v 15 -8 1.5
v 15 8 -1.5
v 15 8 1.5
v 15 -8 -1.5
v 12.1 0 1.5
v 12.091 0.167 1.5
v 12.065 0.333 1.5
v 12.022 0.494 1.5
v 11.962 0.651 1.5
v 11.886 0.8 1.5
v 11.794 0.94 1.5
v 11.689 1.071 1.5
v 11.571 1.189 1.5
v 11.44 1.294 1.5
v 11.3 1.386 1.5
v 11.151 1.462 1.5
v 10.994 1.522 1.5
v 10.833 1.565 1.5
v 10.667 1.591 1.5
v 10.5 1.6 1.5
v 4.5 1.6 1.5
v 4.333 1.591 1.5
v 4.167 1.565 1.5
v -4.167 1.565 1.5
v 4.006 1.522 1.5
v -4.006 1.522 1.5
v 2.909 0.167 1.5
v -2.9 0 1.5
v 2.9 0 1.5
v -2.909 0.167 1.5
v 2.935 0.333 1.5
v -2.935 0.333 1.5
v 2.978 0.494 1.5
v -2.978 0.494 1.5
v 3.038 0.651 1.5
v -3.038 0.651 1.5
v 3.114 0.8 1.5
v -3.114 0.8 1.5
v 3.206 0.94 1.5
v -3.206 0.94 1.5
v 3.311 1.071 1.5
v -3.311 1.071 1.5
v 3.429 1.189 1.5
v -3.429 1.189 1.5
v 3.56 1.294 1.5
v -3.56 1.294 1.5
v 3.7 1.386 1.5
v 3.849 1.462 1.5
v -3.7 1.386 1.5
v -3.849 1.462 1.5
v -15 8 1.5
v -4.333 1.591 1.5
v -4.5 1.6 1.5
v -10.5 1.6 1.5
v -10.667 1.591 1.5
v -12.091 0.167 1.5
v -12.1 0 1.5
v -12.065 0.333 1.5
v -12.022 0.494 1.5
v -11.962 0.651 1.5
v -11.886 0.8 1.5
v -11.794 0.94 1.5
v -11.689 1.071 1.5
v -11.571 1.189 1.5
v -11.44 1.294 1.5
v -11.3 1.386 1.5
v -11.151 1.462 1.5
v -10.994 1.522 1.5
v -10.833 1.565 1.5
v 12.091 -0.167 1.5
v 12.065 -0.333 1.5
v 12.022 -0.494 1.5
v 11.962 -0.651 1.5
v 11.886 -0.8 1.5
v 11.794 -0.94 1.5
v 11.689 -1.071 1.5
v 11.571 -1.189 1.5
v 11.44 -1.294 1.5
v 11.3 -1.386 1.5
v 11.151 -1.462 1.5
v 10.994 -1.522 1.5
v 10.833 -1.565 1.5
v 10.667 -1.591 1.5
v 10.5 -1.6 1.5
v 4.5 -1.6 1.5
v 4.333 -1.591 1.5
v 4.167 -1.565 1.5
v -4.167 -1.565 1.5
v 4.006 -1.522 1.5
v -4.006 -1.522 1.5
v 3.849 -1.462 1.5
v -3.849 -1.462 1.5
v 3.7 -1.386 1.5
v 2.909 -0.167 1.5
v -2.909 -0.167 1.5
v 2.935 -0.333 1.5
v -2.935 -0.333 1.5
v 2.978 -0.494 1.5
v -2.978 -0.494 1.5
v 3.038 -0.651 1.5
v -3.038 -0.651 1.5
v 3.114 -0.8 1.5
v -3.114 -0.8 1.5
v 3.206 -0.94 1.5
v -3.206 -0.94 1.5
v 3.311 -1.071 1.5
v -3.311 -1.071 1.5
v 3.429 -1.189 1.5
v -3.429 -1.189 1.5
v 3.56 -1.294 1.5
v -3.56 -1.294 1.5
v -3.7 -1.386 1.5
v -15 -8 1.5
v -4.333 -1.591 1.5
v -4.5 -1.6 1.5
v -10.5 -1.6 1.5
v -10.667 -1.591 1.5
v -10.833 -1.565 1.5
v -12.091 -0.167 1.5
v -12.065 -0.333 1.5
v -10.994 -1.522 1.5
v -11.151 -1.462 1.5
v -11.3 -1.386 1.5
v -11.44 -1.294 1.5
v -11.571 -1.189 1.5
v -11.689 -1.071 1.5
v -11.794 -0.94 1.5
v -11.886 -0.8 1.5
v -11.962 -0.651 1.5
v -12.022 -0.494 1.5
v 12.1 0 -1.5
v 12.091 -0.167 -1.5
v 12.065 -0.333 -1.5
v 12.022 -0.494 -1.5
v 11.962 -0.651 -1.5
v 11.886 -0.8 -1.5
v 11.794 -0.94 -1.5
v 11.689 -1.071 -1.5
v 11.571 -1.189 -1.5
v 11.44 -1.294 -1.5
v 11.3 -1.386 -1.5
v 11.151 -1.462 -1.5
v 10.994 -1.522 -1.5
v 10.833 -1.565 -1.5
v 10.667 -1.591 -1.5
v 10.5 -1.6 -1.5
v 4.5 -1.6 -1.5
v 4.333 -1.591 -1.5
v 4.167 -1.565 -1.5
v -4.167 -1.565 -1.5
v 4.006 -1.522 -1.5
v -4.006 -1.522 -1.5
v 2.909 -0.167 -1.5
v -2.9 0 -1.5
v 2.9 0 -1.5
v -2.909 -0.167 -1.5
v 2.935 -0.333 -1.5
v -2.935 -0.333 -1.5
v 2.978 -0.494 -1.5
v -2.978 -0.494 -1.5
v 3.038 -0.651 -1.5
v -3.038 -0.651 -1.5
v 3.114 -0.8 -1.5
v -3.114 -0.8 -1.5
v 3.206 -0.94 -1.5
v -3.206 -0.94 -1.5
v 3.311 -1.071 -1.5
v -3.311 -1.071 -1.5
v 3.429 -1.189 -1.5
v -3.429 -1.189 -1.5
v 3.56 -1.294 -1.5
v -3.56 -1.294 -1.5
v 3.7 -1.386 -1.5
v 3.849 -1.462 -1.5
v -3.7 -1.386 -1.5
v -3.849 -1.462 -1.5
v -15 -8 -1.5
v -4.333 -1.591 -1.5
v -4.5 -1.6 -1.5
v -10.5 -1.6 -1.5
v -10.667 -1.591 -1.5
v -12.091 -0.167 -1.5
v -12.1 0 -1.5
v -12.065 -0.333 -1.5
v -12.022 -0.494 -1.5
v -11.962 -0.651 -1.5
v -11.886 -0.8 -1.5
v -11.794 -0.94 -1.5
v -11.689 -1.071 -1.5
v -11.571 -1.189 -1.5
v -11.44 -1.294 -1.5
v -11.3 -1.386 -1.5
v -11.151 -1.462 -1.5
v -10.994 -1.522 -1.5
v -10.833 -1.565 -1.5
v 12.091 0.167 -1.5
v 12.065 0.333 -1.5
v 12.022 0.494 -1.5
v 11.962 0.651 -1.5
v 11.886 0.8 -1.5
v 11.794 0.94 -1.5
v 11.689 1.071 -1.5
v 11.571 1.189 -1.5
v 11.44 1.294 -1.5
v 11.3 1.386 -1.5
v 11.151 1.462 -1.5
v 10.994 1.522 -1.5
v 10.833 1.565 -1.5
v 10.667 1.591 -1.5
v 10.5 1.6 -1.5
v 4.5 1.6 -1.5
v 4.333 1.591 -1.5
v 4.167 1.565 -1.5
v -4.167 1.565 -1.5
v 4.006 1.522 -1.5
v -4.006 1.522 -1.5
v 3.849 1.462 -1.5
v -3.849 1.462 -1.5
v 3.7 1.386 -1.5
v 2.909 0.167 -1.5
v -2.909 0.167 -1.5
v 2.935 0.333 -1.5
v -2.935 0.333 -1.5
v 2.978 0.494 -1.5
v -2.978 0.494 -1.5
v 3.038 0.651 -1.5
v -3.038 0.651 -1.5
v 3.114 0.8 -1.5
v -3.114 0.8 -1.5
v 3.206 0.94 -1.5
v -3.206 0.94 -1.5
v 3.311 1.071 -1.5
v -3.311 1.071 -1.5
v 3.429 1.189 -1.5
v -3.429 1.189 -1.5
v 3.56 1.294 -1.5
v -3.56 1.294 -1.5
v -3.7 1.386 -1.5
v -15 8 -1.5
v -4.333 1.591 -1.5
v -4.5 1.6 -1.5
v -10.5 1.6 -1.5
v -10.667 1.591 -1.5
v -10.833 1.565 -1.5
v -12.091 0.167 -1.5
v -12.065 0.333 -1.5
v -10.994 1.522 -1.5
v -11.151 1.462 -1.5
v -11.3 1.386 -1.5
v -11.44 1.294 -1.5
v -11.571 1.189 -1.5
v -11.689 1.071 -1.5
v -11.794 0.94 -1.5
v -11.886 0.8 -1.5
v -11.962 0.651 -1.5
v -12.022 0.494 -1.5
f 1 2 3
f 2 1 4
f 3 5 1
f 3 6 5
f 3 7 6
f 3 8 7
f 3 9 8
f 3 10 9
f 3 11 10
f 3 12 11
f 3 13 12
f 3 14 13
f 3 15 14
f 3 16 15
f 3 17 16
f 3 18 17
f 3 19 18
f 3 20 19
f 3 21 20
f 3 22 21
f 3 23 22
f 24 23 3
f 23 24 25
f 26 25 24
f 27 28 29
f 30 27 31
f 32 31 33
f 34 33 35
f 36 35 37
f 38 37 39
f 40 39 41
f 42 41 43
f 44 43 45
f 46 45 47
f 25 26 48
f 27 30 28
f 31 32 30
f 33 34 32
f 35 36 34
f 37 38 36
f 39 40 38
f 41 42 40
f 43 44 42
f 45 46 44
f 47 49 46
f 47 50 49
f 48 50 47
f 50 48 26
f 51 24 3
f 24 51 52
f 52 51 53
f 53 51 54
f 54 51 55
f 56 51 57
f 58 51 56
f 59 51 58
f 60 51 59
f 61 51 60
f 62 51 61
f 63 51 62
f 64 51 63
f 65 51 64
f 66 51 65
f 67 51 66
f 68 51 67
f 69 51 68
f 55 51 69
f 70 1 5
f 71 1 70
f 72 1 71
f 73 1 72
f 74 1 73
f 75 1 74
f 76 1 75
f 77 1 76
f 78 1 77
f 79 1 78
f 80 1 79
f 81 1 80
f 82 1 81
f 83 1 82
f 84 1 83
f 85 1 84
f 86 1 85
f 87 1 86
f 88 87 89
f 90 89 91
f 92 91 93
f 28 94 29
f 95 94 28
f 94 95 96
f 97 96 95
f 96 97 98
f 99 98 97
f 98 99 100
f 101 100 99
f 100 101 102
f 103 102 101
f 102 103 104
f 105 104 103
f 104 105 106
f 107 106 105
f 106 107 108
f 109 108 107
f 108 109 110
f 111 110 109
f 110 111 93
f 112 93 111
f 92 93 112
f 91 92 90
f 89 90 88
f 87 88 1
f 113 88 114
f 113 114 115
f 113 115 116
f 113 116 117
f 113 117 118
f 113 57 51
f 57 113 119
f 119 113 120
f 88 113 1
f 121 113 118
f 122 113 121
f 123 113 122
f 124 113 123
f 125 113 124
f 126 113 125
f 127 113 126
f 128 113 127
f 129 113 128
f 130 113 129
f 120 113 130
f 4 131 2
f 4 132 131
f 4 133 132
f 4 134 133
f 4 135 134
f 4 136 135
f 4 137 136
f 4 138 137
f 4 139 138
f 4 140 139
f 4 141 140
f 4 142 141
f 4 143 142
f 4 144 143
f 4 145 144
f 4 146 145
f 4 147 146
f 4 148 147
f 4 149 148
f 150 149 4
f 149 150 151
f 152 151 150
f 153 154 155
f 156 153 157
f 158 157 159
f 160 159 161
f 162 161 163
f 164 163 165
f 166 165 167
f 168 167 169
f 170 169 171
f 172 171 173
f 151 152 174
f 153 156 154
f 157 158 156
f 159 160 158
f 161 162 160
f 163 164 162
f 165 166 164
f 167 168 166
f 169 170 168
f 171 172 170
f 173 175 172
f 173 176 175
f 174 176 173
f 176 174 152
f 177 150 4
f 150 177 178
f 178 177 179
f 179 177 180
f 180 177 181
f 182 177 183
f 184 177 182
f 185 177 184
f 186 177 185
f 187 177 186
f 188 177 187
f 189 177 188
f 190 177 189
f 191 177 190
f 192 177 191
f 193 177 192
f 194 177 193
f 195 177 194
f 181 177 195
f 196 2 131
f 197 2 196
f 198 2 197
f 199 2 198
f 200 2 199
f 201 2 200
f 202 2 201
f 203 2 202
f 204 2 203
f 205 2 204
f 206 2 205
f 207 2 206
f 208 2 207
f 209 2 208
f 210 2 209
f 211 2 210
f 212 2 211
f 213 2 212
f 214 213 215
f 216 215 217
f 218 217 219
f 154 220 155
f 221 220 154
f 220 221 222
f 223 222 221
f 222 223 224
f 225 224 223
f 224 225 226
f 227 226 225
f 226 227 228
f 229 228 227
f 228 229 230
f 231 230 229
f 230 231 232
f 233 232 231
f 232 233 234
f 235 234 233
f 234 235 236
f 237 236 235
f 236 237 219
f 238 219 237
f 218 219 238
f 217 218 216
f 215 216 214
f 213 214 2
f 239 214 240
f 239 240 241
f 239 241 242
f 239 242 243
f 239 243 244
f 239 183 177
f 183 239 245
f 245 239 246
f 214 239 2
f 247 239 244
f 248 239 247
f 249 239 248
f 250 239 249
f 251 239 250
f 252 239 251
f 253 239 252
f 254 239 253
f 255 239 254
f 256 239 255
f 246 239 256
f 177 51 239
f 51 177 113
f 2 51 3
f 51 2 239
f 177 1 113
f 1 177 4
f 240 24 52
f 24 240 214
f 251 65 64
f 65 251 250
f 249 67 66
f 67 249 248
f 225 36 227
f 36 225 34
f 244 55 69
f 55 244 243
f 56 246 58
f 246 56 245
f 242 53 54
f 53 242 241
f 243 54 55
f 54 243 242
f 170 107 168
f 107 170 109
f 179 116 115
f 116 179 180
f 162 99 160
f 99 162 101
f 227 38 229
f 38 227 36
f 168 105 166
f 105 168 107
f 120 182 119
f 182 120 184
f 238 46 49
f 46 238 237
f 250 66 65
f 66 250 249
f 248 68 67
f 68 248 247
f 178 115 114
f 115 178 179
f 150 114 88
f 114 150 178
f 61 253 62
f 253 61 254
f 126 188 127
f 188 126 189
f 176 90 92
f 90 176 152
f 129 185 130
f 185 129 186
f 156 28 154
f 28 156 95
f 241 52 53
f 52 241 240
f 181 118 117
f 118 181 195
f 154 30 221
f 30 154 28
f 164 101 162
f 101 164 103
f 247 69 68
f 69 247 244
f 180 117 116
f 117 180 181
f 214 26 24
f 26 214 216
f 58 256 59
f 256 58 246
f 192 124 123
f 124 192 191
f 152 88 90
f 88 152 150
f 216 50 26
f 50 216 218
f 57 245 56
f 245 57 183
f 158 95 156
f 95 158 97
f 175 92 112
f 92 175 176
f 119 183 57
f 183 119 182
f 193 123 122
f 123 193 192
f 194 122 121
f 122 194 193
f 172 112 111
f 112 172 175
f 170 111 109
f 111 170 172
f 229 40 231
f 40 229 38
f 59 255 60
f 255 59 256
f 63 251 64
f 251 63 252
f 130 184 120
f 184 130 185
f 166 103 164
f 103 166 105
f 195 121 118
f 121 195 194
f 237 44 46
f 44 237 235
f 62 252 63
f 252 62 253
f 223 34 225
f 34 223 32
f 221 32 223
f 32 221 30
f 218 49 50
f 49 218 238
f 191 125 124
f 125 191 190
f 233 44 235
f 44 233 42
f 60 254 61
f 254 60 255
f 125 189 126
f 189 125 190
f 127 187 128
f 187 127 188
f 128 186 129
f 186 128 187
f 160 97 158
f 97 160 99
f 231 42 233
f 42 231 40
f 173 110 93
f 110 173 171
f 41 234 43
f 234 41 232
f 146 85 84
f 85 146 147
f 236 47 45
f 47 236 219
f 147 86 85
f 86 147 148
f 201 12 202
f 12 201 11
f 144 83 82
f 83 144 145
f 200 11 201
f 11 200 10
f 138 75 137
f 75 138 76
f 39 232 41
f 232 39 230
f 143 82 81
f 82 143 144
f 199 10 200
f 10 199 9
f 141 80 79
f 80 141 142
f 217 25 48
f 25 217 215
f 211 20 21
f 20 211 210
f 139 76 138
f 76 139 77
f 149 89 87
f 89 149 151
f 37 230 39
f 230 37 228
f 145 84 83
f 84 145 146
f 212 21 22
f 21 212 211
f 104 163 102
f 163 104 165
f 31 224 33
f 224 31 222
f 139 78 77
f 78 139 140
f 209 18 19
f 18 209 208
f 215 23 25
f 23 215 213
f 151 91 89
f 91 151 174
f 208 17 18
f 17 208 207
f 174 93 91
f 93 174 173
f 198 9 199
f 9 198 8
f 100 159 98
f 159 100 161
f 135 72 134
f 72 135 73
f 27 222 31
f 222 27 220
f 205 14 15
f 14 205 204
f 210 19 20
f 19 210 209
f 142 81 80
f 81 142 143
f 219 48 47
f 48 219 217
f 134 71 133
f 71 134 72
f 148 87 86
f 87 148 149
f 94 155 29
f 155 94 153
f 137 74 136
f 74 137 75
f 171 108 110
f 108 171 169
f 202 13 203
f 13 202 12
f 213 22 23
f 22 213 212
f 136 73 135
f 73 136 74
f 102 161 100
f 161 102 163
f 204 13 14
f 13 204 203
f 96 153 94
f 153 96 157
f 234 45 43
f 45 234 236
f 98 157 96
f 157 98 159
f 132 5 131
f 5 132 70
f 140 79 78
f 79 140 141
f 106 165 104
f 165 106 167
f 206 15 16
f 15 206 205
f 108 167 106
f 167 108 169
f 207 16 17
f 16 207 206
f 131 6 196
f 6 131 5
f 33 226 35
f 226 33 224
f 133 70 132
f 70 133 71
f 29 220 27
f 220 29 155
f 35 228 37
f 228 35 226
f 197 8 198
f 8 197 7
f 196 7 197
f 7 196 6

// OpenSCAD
// Limit-switch mounting plate.
$fn = 60;
eps = 0.02;
plate_l = 30;
plate_w = 16;
plate_t = 3;
slot_l = 6;
module slot(x) { hull() { translate([x-slot_l/2,0,-plate_t/2-eps]) cylinder(d=3.2,h=plate_t+2*eps); translate([x+slot_l/2,0,-plate_t/2-eps]) cylinder(d=3.2,h=plate_t+2*eps); } }
difference() { cube([plate_l,plate_w,plate_t],center=true); slot(-plate_l/4); slot(plate_l/4); }
